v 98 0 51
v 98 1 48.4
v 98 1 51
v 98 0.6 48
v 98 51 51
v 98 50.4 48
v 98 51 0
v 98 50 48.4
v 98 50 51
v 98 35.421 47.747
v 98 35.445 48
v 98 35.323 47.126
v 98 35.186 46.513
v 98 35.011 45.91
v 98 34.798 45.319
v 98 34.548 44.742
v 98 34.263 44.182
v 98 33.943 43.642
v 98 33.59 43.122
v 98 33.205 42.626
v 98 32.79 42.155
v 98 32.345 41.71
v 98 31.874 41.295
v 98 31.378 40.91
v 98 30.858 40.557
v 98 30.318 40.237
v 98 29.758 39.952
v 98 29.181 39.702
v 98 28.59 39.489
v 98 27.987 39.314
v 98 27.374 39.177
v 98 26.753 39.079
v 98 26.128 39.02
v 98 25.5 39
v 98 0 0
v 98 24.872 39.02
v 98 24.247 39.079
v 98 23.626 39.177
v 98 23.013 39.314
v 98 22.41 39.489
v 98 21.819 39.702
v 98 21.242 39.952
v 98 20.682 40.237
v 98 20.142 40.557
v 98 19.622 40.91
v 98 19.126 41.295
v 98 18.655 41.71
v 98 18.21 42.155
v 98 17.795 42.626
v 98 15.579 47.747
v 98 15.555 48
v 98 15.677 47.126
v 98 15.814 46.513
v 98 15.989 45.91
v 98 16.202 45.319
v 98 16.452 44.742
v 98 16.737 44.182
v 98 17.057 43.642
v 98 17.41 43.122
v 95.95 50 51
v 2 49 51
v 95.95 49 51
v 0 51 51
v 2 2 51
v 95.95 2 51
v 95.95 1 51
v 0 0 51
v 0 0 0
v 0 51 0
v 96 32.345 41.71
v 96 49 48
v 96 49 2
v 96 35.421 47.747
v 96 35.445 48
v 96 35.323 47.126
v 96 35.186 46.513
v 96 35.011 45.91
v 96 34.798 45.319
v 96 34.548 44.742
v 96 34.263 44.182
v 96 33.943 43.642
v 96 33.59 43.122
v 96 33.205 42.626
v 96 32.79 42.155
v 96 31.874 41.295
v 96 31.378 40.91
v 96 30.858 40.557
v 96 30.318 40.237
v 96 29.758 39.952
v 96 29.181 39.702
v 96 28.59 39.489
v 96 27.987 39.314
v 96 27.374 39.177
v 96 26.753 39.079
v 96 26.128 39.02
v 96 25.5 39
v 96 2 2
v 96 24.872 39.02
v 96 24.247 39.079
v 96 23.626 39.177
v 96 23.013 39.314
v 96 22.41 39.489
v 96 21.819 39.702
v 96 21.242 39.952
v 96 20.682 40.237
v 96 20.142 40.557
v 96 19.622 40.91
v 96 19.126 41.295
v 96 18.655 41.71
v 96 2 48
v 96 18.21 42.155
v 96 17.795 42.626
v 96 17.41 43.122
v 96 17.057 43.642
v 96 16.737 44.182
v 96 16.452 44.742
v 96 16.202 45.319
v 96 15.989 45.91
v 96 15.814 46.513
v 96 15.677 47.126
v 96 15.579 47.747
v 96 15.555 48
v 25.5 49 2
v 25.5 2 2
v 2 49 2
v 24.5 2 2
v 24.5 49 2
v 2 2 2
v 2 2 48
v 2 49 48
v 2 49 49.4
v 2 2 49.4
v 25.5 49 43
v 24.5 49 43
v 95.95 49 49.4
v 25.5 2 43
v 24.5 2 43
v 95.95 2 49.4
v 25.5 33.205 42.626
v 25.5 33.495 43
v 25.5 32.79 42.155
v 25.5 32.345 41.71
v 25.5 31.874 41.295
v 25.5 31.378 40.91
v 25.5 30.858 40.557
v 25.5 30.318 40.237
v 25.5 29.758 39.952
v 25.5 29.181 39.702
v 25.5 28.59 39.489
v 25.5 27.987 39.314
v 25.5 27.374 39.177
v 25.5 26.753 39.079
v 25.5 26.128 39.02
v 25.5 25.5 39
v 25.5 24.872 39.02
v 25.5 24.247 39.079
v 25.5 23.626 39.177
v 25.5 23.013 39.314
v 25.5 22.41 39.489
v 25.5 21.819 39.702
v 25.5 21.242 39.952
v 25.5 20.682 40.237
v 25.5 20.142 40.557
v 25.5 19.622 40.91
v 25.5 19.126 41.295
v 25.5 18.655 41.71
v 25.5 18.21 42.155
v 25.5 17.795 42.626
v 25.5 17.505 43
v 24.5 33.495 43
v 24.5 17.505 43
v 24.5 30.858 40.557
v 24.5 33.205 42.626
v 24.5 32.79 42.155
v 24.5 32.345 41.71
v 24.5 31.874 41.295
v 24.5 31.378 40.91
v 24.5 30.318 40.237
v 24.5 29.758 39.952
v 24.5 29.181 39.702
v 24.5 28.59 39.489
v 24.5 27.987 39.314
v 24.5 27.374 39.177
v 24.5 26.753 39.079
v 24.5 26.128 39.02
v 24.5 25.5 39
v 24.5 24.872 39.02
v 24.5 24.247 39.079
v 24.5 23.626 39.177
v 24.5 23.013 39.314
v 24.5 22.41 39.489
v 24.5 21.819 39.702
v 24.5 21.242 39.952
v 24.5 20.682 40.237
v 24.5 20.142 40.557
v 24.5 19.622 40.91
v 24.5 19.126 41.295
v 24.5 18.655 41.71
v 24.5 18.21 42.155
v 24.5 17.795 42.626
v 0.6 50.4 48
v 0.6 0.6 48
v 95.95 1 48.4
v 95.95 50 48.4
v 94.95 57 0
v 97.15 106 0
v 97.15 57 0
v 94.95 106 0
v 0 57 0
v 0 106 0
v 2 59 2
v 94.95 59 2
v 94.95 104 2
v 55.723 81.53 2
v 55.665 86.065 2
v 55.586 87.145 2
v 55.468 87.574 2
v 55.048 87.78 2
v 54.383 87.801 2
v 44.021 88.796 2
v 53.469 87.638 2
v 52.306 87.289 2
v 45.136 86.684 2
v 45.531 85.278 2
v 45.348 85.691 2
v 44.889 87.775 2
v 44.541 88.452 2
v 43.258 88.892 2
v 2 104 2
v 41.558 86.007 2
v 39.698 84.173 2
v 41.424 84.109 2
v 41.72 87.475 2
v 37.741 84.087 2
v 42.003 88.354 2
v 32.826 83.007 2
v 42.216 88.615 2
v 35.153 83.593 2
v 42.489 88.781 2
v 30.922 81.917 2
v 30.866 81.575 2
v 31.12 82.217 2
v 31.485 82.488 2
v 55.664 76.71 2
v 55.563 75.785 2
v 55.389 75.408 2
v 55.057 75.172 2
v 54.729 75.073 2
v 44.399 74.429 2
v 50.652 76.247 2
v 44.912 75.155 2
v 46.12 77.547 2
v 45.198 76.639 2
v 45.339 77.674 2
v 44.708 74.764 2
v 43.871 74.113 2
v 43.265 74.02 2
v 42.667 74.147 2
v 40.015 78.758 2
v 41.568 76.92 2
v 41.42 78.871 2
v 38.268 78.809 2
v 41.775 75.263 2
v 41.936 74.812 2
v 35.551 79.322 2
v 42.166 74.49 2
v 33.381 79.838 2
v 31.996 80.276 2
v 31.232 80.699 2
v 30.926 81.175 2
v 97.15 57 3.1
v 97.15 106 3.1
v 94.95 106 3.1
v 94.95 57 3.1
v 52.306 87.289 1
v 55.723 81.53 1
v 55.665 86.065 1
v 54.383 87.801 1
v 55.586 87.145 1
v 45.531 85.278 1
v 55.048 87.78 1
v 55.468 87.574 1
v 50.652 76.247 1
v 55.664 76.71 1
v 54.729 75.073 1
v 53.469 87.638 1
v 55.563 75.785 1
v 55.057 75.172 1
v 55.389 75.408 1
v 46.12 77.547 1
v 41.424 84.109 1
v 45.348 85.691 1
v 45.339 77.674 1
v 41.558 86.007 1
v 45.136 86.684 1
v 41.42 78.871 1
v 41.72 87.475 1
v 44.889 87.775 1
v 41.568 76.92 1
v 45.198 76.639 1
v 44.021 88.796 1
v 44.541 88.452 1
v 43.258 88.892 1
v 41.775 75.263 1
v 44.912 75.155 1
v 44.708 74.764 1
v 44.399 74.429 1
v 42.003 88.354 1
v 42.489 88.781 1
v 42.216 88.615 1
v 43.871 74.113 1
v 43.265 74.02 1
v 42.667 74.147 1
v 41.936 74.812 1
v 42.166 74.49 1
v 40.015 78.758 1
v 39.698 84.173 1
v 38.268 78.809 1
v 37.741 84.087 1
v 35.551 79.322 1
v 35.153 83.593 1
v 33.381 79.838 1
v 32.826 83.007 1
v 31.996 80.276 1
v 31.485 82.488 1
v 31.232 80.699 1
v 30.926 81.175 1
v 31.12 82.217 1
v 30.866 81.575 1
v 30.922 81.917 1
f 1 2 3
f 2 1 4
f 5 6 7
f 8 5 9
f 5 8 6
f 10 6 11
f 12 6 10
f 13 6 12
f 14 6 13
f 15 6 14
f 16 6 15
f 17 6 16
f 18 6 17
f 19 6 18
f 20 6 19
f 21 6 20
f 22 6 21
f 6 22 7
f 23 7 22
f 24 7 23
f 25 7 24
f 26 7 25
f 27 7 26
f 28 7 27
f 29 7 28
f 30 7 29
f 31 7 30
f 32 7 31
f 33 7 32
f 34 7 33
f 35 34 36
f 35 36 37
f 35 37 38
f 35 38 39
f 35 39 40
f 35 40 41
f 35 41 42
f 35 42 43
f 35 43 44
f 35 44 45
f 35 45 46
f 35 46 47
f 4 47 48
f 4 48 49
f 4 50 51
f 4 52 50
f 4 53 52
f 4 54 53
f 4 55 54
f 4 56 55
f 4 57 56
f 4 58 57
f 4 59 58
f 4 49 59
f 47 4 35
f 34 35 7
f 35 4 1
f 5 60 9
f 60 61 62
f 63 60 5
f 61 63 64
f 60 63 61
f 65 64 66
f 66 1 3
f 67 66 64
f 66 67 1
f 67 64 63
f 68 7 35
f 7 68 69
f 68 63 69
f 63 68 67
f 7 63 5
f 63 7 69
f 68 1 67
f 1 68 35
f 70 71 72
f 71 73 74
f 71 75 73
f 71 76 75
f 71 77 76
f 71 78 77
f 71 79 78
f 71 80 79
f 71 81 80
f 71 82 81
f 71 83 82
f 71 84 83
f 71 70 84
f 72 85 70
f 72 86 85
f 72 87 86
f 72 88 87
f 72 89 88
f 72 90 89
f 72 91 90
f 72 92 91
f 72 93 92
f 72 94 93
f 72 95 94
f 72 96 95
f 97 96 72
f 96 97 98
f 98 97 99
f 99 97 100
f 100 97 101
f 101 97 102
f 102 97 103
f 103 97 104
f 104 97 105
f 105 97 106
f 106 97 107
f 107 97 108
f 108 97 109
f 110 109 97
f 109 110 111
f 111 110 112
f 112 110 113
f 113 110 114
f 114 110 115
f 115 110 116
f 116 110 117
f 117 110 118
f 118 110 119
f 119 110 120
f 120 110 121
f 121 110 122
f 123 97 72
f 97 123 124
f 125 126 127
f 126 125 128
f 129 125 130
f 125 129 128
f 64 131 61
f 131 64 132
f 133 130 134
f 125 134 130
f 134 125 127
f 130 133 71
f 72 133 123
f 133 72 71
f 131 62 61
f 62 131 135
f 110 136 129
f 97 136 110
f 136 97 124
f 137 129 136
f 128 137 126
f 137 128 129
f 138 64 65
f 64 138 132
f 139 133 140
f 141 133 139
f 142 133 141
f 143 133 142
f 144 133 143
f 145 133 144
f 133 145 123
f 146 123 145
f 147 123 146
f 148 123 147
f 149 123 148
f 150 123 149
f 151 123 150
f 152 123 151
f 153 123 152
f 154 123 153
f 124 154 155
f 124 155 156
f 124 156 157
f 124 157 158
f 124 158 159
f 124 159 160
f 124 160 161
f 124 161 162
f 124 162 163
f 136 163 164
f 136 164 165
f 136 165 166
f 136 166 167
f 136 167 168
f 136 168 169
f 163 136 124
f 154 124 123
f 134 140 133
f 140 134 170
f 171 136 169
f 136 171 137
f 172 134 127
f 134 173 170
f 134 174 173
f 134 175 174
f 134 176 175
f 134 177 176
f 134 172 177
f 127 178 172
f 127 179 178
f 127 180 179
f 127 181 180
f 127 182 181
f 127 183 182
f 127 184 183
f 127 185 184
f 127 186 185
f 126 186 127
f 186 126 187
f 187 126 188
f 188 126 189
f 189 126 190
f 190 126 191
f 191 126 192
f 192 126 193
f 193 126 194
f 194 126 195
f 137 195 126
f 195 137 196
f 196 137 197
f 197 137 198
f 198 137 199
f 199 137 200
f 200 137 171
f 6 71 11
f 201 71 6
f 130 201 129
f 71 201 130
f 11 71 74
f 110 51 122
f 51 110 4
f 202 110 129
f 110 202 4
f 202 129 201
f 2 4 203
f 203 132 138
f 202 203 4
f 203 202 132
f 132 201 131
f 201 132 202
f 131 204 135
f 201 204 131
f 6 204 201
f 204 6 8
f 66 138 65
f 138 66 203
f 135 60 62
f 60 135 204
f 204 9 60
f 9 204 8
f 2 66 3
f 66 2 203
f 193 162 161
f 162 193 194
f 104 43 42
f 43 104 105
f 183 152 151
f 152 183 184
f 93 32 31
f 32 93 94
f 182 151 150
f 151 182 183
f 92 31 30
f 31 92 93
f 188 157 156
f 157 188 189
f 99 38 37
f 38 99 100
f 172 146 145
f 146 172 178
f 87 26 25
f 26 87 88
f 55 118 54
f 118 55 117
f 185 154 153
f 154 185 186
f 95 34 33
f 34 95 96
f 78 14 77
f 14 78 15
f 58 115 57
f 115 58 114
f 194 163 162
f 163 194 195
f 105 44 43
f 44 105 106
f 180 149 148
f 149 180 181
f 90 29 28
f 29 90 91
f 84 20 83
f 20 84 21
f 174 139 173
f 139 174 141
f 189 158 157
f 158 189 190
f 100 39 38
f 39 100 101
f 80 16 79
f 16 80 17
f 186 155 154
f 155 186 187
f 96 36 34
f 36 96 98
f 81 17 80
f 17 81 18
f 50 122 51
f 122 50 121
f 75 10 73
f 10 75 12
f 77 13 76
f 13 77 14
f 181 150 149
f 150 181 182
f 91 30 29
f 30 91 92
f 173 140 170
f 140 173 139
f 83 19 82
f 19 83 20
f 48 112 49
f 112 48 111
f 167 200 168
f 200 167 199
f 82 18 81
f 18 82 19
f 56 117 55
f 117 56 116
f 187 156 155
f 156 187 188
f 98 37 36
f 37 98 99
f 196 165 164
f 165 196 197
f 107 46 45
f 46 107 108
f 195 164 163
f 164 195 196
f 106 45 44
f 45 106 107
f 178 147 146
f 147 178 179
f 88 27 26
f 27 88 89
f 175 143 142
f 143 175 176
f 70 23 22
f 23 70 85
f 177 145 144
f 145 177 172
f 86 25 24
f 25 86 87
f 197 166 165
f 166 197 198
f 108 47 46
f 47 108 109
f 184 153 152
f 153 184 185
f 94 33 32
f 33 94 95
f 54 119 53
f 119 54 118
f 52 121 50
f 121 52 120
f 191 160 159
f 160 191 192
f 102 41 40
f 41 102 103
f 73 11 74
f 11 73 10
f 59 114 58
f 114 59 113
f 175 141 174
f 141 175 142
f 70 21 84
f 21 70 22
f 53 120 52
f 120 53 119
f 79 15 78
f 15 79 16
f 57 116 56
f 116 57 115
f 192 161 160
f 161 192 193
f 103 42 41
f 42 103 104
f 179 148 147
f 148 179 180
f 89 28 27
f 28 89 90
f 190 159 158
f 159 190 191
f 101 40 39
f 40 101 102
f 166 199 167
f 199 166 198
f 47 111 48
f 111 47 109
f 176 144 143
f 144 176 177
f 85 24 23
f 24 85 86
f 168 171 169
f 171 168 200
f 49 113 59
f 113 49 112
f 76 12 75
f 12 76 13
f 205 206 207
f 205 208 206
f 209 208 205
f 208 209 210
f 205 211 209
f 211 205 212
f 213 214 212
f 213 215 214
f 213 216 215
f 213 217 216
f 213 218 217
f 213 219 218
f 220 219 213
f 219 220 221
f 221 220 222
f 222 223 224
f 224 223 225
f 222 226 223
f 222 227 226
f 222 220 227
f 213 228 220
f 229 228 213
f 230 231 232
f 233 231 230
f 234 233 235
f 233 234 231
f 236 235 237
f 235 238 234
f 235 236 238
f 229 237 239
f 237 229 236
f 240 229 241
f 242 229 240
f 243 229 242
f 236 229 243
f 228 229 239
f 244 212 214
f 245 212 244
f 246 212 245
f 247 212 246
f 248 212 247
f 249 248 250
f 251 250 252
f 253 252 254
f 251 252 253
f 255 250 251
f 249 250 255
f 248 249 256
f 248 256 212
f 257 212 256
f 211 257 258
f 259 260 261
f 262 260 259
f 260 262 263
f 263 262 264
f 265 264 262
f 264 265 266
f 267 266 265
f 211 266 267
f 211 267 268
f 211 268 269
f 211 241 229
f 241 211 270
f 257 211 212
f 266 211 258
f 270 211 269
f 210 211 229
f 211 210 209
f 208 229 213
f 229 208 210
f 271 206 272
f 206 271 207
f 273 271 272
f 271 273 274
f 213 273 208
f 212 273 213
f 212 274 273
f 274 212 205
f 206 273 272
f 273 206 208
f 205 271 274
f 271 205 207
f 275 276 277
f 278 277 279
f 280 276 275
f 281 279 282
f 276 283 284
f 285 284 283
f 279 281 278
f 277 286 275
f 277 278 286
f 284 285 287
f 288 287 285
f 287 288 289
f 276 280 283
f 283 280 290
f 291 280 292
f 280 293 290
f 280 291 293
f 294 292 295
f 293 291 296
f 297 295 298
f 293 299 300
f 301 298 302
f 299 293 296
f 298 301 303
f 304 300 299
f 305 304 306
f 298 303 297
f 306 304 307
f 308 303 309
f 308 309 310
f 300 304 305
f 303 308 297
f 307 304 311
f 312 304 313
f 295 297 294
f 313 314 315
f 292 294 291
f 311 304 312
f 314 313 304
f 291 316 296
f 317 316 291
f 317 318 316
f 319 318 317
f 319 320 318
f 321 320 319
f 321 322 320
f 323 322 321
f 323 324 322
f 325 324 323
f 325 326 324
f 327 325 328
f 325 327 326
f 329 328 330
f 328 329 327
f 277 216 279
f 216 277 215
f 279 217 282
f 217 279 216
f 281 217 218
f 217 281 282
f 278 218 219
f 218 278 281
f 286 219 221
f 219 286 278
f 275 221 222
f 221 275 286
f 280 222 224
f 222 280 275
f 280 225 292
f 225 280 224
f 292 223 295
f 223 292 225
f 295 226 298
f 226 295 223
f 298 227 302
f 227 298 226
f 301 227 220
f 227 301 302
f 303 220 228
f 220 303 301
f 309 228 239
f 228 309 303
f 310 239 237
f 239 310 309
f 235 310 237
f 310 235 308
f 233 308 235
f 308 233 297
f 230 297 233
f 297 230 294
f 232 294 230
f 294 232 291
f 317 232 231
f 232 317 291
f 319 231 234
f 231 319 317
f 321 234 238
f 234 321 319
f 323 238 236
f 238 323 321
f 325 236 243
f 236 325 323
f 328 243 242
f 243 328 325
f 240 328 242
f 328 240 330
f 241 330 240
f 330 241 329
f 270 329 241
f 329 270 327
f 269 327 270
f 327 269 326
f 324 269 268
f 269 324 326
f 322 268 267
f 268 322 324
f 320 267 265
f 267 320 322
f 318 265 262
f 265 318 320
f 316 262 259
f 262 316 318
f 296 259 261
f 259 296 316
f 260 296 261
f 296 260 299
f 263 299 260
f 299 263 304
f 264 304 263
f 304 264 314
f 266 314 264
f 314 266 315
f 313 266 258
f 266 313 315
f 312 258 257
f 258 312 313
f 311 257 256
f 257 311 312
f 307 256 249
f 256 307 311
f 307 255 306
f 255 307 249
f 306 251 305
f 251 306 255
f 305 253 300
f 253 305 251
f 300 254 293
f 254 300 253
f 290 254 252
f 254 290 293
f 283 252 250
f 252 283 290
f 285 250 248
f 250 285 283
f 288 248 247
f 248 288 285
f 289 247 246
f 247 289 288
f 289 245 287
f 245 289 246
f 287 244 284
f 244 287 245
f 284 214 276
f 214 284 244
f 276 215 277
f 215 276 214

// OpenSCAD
// file: carcassonne_box.scad
/**
 * @file carcassonne_box.scad
 * @author Conlan Wesson
 * Template for Carcossonne boxes.
 * @copyright Creative Commons Attribution-NonCommercial-ShareAlike 4.0
 */

mm = 1;
cm = 10*mm;

width = 47*mm;
thick = 2.5*mm;
wall = 2*mm;

/**
 * Lid for box.
 * @param count Number of cards.
 * @param columns Number of columns.
 * @param icon Path to icon DXF file.
 * @param rot Icon rotation in degrees.
 * @param mult Icon scale.
 * @param xoff X-offset of icon from center.
 * @param yoff Y-offset of icon from center.
 */
module carcassonne_lid(count, columns=1, icon=false, rot=0, mult=1, xoff=0, yoff=0, g=0){
	length = (thick * count) + ((width/2) - ((thick * count) % (width/2)));
	w = length+(1.5*wall)+.1;
	l = (width*columns)+wall;
	h = wall;
	d = 2;

	CubePoints = [
		[ 0-g, 0-g,   0 ],  //0
		[ w+g, 0-g,   0 ],  //1
		[ w+g, l+g,   0 ],  //2
		[ 0-g, l+g,   0 ],  //3
		[   d,   d, h+g ],  //4
		[   w,   d, h+g ],  //5
		[   w, l-d, h+g ],  //6
		[   d, l-d, h+g ]   //7
	];
	
	CubeFaces = [
		[0,1,2,3],  // bottom
		[4,5,1,0],  // front
		[7,6,5,4],  // top
		[5,6,2,1],  // right
		[6,7,3,2],  // back
		[7,4,0,3]   // left
	];
	
	
	difference(){
		union(){
			polyhedron( CubePoints, CubeFaces );
			translate([w-wall-.15,0,0]) cube([wall+.2,l, (1.5*wall)+.1]);
		}
		if(icon){
			translate([w/2+xoff,l/3+yoff,h-(wall/2)]){
				linear_extrude(height=(wall)+.1){
					rotate(rot) scale(mult) import(icon);
				}
			}
		}
	}
}

/**
 * Carcassonne card box.
 * @param count Number of cards.
 * @param dividers Array of divider positions.
 * @param columns Number of columns.
 */
module carcassonne_box(count, dividers=[], columns=1){
	length = (thick * count) + ((width/2) - ((thick * count) % (width/2)));
	difference(){
		union(){
			difference(){
				// Outer walls
				cube([length+(2*wall), (width*columns)+(2*wall), width+(2*wall)]);
				// Cavity
				translate([wall, wall, wall]){
					cube([length, width*columns, (width+wall)+.1]);
				}
			}
			// Dividers
			for(col = [0:columns-1]){
				for(div = dividers[col]){
					translate([(div*(width/2))+(wall/2), width*col+wall, 0]) cube([wall/2, width, width-(2*wall)]);
				}
				if(col > 0){
					translate([0, width*col+(wall/2), 0]) cube([length+(2*wall), wall/2, width-(2*wall)]);
				}
			}
		}
		union(){
			// Notch
			for(col = [0:columns-1]){
				translate([wall, wall+(width*col), wall]){
					translate([0, width/2, width])
					rotate([0, 90, 0]){
						cylinder(r=10, h=length+(2*wall), $fn=100);
					}
				}
			}
			// Track
			translate([wall/2,wall/2,width+wall/2]) carcassonne_lid(count, columns, g=0.4);
		}
	}
}
// main file
/**
 * @file princessdragon.scad
 * @author Conlan Wesson
 * Princess and Dragon Carcossonne box.
 * @copyright Creative Commons Attribution-NonCommercial-ShareAlike 4.0
 */

include <carcassonne_box.scad>

count = 30;
dividers = [[1]];
columns = 1;

carcassonne_box(count, dividers, columns);
translate([0,width*columns+10,0]) carcassonne_lid(count, columns, icon="princessdragon.dxf", rot=90, mult=0.1, xoff=11, yoff=-4);
